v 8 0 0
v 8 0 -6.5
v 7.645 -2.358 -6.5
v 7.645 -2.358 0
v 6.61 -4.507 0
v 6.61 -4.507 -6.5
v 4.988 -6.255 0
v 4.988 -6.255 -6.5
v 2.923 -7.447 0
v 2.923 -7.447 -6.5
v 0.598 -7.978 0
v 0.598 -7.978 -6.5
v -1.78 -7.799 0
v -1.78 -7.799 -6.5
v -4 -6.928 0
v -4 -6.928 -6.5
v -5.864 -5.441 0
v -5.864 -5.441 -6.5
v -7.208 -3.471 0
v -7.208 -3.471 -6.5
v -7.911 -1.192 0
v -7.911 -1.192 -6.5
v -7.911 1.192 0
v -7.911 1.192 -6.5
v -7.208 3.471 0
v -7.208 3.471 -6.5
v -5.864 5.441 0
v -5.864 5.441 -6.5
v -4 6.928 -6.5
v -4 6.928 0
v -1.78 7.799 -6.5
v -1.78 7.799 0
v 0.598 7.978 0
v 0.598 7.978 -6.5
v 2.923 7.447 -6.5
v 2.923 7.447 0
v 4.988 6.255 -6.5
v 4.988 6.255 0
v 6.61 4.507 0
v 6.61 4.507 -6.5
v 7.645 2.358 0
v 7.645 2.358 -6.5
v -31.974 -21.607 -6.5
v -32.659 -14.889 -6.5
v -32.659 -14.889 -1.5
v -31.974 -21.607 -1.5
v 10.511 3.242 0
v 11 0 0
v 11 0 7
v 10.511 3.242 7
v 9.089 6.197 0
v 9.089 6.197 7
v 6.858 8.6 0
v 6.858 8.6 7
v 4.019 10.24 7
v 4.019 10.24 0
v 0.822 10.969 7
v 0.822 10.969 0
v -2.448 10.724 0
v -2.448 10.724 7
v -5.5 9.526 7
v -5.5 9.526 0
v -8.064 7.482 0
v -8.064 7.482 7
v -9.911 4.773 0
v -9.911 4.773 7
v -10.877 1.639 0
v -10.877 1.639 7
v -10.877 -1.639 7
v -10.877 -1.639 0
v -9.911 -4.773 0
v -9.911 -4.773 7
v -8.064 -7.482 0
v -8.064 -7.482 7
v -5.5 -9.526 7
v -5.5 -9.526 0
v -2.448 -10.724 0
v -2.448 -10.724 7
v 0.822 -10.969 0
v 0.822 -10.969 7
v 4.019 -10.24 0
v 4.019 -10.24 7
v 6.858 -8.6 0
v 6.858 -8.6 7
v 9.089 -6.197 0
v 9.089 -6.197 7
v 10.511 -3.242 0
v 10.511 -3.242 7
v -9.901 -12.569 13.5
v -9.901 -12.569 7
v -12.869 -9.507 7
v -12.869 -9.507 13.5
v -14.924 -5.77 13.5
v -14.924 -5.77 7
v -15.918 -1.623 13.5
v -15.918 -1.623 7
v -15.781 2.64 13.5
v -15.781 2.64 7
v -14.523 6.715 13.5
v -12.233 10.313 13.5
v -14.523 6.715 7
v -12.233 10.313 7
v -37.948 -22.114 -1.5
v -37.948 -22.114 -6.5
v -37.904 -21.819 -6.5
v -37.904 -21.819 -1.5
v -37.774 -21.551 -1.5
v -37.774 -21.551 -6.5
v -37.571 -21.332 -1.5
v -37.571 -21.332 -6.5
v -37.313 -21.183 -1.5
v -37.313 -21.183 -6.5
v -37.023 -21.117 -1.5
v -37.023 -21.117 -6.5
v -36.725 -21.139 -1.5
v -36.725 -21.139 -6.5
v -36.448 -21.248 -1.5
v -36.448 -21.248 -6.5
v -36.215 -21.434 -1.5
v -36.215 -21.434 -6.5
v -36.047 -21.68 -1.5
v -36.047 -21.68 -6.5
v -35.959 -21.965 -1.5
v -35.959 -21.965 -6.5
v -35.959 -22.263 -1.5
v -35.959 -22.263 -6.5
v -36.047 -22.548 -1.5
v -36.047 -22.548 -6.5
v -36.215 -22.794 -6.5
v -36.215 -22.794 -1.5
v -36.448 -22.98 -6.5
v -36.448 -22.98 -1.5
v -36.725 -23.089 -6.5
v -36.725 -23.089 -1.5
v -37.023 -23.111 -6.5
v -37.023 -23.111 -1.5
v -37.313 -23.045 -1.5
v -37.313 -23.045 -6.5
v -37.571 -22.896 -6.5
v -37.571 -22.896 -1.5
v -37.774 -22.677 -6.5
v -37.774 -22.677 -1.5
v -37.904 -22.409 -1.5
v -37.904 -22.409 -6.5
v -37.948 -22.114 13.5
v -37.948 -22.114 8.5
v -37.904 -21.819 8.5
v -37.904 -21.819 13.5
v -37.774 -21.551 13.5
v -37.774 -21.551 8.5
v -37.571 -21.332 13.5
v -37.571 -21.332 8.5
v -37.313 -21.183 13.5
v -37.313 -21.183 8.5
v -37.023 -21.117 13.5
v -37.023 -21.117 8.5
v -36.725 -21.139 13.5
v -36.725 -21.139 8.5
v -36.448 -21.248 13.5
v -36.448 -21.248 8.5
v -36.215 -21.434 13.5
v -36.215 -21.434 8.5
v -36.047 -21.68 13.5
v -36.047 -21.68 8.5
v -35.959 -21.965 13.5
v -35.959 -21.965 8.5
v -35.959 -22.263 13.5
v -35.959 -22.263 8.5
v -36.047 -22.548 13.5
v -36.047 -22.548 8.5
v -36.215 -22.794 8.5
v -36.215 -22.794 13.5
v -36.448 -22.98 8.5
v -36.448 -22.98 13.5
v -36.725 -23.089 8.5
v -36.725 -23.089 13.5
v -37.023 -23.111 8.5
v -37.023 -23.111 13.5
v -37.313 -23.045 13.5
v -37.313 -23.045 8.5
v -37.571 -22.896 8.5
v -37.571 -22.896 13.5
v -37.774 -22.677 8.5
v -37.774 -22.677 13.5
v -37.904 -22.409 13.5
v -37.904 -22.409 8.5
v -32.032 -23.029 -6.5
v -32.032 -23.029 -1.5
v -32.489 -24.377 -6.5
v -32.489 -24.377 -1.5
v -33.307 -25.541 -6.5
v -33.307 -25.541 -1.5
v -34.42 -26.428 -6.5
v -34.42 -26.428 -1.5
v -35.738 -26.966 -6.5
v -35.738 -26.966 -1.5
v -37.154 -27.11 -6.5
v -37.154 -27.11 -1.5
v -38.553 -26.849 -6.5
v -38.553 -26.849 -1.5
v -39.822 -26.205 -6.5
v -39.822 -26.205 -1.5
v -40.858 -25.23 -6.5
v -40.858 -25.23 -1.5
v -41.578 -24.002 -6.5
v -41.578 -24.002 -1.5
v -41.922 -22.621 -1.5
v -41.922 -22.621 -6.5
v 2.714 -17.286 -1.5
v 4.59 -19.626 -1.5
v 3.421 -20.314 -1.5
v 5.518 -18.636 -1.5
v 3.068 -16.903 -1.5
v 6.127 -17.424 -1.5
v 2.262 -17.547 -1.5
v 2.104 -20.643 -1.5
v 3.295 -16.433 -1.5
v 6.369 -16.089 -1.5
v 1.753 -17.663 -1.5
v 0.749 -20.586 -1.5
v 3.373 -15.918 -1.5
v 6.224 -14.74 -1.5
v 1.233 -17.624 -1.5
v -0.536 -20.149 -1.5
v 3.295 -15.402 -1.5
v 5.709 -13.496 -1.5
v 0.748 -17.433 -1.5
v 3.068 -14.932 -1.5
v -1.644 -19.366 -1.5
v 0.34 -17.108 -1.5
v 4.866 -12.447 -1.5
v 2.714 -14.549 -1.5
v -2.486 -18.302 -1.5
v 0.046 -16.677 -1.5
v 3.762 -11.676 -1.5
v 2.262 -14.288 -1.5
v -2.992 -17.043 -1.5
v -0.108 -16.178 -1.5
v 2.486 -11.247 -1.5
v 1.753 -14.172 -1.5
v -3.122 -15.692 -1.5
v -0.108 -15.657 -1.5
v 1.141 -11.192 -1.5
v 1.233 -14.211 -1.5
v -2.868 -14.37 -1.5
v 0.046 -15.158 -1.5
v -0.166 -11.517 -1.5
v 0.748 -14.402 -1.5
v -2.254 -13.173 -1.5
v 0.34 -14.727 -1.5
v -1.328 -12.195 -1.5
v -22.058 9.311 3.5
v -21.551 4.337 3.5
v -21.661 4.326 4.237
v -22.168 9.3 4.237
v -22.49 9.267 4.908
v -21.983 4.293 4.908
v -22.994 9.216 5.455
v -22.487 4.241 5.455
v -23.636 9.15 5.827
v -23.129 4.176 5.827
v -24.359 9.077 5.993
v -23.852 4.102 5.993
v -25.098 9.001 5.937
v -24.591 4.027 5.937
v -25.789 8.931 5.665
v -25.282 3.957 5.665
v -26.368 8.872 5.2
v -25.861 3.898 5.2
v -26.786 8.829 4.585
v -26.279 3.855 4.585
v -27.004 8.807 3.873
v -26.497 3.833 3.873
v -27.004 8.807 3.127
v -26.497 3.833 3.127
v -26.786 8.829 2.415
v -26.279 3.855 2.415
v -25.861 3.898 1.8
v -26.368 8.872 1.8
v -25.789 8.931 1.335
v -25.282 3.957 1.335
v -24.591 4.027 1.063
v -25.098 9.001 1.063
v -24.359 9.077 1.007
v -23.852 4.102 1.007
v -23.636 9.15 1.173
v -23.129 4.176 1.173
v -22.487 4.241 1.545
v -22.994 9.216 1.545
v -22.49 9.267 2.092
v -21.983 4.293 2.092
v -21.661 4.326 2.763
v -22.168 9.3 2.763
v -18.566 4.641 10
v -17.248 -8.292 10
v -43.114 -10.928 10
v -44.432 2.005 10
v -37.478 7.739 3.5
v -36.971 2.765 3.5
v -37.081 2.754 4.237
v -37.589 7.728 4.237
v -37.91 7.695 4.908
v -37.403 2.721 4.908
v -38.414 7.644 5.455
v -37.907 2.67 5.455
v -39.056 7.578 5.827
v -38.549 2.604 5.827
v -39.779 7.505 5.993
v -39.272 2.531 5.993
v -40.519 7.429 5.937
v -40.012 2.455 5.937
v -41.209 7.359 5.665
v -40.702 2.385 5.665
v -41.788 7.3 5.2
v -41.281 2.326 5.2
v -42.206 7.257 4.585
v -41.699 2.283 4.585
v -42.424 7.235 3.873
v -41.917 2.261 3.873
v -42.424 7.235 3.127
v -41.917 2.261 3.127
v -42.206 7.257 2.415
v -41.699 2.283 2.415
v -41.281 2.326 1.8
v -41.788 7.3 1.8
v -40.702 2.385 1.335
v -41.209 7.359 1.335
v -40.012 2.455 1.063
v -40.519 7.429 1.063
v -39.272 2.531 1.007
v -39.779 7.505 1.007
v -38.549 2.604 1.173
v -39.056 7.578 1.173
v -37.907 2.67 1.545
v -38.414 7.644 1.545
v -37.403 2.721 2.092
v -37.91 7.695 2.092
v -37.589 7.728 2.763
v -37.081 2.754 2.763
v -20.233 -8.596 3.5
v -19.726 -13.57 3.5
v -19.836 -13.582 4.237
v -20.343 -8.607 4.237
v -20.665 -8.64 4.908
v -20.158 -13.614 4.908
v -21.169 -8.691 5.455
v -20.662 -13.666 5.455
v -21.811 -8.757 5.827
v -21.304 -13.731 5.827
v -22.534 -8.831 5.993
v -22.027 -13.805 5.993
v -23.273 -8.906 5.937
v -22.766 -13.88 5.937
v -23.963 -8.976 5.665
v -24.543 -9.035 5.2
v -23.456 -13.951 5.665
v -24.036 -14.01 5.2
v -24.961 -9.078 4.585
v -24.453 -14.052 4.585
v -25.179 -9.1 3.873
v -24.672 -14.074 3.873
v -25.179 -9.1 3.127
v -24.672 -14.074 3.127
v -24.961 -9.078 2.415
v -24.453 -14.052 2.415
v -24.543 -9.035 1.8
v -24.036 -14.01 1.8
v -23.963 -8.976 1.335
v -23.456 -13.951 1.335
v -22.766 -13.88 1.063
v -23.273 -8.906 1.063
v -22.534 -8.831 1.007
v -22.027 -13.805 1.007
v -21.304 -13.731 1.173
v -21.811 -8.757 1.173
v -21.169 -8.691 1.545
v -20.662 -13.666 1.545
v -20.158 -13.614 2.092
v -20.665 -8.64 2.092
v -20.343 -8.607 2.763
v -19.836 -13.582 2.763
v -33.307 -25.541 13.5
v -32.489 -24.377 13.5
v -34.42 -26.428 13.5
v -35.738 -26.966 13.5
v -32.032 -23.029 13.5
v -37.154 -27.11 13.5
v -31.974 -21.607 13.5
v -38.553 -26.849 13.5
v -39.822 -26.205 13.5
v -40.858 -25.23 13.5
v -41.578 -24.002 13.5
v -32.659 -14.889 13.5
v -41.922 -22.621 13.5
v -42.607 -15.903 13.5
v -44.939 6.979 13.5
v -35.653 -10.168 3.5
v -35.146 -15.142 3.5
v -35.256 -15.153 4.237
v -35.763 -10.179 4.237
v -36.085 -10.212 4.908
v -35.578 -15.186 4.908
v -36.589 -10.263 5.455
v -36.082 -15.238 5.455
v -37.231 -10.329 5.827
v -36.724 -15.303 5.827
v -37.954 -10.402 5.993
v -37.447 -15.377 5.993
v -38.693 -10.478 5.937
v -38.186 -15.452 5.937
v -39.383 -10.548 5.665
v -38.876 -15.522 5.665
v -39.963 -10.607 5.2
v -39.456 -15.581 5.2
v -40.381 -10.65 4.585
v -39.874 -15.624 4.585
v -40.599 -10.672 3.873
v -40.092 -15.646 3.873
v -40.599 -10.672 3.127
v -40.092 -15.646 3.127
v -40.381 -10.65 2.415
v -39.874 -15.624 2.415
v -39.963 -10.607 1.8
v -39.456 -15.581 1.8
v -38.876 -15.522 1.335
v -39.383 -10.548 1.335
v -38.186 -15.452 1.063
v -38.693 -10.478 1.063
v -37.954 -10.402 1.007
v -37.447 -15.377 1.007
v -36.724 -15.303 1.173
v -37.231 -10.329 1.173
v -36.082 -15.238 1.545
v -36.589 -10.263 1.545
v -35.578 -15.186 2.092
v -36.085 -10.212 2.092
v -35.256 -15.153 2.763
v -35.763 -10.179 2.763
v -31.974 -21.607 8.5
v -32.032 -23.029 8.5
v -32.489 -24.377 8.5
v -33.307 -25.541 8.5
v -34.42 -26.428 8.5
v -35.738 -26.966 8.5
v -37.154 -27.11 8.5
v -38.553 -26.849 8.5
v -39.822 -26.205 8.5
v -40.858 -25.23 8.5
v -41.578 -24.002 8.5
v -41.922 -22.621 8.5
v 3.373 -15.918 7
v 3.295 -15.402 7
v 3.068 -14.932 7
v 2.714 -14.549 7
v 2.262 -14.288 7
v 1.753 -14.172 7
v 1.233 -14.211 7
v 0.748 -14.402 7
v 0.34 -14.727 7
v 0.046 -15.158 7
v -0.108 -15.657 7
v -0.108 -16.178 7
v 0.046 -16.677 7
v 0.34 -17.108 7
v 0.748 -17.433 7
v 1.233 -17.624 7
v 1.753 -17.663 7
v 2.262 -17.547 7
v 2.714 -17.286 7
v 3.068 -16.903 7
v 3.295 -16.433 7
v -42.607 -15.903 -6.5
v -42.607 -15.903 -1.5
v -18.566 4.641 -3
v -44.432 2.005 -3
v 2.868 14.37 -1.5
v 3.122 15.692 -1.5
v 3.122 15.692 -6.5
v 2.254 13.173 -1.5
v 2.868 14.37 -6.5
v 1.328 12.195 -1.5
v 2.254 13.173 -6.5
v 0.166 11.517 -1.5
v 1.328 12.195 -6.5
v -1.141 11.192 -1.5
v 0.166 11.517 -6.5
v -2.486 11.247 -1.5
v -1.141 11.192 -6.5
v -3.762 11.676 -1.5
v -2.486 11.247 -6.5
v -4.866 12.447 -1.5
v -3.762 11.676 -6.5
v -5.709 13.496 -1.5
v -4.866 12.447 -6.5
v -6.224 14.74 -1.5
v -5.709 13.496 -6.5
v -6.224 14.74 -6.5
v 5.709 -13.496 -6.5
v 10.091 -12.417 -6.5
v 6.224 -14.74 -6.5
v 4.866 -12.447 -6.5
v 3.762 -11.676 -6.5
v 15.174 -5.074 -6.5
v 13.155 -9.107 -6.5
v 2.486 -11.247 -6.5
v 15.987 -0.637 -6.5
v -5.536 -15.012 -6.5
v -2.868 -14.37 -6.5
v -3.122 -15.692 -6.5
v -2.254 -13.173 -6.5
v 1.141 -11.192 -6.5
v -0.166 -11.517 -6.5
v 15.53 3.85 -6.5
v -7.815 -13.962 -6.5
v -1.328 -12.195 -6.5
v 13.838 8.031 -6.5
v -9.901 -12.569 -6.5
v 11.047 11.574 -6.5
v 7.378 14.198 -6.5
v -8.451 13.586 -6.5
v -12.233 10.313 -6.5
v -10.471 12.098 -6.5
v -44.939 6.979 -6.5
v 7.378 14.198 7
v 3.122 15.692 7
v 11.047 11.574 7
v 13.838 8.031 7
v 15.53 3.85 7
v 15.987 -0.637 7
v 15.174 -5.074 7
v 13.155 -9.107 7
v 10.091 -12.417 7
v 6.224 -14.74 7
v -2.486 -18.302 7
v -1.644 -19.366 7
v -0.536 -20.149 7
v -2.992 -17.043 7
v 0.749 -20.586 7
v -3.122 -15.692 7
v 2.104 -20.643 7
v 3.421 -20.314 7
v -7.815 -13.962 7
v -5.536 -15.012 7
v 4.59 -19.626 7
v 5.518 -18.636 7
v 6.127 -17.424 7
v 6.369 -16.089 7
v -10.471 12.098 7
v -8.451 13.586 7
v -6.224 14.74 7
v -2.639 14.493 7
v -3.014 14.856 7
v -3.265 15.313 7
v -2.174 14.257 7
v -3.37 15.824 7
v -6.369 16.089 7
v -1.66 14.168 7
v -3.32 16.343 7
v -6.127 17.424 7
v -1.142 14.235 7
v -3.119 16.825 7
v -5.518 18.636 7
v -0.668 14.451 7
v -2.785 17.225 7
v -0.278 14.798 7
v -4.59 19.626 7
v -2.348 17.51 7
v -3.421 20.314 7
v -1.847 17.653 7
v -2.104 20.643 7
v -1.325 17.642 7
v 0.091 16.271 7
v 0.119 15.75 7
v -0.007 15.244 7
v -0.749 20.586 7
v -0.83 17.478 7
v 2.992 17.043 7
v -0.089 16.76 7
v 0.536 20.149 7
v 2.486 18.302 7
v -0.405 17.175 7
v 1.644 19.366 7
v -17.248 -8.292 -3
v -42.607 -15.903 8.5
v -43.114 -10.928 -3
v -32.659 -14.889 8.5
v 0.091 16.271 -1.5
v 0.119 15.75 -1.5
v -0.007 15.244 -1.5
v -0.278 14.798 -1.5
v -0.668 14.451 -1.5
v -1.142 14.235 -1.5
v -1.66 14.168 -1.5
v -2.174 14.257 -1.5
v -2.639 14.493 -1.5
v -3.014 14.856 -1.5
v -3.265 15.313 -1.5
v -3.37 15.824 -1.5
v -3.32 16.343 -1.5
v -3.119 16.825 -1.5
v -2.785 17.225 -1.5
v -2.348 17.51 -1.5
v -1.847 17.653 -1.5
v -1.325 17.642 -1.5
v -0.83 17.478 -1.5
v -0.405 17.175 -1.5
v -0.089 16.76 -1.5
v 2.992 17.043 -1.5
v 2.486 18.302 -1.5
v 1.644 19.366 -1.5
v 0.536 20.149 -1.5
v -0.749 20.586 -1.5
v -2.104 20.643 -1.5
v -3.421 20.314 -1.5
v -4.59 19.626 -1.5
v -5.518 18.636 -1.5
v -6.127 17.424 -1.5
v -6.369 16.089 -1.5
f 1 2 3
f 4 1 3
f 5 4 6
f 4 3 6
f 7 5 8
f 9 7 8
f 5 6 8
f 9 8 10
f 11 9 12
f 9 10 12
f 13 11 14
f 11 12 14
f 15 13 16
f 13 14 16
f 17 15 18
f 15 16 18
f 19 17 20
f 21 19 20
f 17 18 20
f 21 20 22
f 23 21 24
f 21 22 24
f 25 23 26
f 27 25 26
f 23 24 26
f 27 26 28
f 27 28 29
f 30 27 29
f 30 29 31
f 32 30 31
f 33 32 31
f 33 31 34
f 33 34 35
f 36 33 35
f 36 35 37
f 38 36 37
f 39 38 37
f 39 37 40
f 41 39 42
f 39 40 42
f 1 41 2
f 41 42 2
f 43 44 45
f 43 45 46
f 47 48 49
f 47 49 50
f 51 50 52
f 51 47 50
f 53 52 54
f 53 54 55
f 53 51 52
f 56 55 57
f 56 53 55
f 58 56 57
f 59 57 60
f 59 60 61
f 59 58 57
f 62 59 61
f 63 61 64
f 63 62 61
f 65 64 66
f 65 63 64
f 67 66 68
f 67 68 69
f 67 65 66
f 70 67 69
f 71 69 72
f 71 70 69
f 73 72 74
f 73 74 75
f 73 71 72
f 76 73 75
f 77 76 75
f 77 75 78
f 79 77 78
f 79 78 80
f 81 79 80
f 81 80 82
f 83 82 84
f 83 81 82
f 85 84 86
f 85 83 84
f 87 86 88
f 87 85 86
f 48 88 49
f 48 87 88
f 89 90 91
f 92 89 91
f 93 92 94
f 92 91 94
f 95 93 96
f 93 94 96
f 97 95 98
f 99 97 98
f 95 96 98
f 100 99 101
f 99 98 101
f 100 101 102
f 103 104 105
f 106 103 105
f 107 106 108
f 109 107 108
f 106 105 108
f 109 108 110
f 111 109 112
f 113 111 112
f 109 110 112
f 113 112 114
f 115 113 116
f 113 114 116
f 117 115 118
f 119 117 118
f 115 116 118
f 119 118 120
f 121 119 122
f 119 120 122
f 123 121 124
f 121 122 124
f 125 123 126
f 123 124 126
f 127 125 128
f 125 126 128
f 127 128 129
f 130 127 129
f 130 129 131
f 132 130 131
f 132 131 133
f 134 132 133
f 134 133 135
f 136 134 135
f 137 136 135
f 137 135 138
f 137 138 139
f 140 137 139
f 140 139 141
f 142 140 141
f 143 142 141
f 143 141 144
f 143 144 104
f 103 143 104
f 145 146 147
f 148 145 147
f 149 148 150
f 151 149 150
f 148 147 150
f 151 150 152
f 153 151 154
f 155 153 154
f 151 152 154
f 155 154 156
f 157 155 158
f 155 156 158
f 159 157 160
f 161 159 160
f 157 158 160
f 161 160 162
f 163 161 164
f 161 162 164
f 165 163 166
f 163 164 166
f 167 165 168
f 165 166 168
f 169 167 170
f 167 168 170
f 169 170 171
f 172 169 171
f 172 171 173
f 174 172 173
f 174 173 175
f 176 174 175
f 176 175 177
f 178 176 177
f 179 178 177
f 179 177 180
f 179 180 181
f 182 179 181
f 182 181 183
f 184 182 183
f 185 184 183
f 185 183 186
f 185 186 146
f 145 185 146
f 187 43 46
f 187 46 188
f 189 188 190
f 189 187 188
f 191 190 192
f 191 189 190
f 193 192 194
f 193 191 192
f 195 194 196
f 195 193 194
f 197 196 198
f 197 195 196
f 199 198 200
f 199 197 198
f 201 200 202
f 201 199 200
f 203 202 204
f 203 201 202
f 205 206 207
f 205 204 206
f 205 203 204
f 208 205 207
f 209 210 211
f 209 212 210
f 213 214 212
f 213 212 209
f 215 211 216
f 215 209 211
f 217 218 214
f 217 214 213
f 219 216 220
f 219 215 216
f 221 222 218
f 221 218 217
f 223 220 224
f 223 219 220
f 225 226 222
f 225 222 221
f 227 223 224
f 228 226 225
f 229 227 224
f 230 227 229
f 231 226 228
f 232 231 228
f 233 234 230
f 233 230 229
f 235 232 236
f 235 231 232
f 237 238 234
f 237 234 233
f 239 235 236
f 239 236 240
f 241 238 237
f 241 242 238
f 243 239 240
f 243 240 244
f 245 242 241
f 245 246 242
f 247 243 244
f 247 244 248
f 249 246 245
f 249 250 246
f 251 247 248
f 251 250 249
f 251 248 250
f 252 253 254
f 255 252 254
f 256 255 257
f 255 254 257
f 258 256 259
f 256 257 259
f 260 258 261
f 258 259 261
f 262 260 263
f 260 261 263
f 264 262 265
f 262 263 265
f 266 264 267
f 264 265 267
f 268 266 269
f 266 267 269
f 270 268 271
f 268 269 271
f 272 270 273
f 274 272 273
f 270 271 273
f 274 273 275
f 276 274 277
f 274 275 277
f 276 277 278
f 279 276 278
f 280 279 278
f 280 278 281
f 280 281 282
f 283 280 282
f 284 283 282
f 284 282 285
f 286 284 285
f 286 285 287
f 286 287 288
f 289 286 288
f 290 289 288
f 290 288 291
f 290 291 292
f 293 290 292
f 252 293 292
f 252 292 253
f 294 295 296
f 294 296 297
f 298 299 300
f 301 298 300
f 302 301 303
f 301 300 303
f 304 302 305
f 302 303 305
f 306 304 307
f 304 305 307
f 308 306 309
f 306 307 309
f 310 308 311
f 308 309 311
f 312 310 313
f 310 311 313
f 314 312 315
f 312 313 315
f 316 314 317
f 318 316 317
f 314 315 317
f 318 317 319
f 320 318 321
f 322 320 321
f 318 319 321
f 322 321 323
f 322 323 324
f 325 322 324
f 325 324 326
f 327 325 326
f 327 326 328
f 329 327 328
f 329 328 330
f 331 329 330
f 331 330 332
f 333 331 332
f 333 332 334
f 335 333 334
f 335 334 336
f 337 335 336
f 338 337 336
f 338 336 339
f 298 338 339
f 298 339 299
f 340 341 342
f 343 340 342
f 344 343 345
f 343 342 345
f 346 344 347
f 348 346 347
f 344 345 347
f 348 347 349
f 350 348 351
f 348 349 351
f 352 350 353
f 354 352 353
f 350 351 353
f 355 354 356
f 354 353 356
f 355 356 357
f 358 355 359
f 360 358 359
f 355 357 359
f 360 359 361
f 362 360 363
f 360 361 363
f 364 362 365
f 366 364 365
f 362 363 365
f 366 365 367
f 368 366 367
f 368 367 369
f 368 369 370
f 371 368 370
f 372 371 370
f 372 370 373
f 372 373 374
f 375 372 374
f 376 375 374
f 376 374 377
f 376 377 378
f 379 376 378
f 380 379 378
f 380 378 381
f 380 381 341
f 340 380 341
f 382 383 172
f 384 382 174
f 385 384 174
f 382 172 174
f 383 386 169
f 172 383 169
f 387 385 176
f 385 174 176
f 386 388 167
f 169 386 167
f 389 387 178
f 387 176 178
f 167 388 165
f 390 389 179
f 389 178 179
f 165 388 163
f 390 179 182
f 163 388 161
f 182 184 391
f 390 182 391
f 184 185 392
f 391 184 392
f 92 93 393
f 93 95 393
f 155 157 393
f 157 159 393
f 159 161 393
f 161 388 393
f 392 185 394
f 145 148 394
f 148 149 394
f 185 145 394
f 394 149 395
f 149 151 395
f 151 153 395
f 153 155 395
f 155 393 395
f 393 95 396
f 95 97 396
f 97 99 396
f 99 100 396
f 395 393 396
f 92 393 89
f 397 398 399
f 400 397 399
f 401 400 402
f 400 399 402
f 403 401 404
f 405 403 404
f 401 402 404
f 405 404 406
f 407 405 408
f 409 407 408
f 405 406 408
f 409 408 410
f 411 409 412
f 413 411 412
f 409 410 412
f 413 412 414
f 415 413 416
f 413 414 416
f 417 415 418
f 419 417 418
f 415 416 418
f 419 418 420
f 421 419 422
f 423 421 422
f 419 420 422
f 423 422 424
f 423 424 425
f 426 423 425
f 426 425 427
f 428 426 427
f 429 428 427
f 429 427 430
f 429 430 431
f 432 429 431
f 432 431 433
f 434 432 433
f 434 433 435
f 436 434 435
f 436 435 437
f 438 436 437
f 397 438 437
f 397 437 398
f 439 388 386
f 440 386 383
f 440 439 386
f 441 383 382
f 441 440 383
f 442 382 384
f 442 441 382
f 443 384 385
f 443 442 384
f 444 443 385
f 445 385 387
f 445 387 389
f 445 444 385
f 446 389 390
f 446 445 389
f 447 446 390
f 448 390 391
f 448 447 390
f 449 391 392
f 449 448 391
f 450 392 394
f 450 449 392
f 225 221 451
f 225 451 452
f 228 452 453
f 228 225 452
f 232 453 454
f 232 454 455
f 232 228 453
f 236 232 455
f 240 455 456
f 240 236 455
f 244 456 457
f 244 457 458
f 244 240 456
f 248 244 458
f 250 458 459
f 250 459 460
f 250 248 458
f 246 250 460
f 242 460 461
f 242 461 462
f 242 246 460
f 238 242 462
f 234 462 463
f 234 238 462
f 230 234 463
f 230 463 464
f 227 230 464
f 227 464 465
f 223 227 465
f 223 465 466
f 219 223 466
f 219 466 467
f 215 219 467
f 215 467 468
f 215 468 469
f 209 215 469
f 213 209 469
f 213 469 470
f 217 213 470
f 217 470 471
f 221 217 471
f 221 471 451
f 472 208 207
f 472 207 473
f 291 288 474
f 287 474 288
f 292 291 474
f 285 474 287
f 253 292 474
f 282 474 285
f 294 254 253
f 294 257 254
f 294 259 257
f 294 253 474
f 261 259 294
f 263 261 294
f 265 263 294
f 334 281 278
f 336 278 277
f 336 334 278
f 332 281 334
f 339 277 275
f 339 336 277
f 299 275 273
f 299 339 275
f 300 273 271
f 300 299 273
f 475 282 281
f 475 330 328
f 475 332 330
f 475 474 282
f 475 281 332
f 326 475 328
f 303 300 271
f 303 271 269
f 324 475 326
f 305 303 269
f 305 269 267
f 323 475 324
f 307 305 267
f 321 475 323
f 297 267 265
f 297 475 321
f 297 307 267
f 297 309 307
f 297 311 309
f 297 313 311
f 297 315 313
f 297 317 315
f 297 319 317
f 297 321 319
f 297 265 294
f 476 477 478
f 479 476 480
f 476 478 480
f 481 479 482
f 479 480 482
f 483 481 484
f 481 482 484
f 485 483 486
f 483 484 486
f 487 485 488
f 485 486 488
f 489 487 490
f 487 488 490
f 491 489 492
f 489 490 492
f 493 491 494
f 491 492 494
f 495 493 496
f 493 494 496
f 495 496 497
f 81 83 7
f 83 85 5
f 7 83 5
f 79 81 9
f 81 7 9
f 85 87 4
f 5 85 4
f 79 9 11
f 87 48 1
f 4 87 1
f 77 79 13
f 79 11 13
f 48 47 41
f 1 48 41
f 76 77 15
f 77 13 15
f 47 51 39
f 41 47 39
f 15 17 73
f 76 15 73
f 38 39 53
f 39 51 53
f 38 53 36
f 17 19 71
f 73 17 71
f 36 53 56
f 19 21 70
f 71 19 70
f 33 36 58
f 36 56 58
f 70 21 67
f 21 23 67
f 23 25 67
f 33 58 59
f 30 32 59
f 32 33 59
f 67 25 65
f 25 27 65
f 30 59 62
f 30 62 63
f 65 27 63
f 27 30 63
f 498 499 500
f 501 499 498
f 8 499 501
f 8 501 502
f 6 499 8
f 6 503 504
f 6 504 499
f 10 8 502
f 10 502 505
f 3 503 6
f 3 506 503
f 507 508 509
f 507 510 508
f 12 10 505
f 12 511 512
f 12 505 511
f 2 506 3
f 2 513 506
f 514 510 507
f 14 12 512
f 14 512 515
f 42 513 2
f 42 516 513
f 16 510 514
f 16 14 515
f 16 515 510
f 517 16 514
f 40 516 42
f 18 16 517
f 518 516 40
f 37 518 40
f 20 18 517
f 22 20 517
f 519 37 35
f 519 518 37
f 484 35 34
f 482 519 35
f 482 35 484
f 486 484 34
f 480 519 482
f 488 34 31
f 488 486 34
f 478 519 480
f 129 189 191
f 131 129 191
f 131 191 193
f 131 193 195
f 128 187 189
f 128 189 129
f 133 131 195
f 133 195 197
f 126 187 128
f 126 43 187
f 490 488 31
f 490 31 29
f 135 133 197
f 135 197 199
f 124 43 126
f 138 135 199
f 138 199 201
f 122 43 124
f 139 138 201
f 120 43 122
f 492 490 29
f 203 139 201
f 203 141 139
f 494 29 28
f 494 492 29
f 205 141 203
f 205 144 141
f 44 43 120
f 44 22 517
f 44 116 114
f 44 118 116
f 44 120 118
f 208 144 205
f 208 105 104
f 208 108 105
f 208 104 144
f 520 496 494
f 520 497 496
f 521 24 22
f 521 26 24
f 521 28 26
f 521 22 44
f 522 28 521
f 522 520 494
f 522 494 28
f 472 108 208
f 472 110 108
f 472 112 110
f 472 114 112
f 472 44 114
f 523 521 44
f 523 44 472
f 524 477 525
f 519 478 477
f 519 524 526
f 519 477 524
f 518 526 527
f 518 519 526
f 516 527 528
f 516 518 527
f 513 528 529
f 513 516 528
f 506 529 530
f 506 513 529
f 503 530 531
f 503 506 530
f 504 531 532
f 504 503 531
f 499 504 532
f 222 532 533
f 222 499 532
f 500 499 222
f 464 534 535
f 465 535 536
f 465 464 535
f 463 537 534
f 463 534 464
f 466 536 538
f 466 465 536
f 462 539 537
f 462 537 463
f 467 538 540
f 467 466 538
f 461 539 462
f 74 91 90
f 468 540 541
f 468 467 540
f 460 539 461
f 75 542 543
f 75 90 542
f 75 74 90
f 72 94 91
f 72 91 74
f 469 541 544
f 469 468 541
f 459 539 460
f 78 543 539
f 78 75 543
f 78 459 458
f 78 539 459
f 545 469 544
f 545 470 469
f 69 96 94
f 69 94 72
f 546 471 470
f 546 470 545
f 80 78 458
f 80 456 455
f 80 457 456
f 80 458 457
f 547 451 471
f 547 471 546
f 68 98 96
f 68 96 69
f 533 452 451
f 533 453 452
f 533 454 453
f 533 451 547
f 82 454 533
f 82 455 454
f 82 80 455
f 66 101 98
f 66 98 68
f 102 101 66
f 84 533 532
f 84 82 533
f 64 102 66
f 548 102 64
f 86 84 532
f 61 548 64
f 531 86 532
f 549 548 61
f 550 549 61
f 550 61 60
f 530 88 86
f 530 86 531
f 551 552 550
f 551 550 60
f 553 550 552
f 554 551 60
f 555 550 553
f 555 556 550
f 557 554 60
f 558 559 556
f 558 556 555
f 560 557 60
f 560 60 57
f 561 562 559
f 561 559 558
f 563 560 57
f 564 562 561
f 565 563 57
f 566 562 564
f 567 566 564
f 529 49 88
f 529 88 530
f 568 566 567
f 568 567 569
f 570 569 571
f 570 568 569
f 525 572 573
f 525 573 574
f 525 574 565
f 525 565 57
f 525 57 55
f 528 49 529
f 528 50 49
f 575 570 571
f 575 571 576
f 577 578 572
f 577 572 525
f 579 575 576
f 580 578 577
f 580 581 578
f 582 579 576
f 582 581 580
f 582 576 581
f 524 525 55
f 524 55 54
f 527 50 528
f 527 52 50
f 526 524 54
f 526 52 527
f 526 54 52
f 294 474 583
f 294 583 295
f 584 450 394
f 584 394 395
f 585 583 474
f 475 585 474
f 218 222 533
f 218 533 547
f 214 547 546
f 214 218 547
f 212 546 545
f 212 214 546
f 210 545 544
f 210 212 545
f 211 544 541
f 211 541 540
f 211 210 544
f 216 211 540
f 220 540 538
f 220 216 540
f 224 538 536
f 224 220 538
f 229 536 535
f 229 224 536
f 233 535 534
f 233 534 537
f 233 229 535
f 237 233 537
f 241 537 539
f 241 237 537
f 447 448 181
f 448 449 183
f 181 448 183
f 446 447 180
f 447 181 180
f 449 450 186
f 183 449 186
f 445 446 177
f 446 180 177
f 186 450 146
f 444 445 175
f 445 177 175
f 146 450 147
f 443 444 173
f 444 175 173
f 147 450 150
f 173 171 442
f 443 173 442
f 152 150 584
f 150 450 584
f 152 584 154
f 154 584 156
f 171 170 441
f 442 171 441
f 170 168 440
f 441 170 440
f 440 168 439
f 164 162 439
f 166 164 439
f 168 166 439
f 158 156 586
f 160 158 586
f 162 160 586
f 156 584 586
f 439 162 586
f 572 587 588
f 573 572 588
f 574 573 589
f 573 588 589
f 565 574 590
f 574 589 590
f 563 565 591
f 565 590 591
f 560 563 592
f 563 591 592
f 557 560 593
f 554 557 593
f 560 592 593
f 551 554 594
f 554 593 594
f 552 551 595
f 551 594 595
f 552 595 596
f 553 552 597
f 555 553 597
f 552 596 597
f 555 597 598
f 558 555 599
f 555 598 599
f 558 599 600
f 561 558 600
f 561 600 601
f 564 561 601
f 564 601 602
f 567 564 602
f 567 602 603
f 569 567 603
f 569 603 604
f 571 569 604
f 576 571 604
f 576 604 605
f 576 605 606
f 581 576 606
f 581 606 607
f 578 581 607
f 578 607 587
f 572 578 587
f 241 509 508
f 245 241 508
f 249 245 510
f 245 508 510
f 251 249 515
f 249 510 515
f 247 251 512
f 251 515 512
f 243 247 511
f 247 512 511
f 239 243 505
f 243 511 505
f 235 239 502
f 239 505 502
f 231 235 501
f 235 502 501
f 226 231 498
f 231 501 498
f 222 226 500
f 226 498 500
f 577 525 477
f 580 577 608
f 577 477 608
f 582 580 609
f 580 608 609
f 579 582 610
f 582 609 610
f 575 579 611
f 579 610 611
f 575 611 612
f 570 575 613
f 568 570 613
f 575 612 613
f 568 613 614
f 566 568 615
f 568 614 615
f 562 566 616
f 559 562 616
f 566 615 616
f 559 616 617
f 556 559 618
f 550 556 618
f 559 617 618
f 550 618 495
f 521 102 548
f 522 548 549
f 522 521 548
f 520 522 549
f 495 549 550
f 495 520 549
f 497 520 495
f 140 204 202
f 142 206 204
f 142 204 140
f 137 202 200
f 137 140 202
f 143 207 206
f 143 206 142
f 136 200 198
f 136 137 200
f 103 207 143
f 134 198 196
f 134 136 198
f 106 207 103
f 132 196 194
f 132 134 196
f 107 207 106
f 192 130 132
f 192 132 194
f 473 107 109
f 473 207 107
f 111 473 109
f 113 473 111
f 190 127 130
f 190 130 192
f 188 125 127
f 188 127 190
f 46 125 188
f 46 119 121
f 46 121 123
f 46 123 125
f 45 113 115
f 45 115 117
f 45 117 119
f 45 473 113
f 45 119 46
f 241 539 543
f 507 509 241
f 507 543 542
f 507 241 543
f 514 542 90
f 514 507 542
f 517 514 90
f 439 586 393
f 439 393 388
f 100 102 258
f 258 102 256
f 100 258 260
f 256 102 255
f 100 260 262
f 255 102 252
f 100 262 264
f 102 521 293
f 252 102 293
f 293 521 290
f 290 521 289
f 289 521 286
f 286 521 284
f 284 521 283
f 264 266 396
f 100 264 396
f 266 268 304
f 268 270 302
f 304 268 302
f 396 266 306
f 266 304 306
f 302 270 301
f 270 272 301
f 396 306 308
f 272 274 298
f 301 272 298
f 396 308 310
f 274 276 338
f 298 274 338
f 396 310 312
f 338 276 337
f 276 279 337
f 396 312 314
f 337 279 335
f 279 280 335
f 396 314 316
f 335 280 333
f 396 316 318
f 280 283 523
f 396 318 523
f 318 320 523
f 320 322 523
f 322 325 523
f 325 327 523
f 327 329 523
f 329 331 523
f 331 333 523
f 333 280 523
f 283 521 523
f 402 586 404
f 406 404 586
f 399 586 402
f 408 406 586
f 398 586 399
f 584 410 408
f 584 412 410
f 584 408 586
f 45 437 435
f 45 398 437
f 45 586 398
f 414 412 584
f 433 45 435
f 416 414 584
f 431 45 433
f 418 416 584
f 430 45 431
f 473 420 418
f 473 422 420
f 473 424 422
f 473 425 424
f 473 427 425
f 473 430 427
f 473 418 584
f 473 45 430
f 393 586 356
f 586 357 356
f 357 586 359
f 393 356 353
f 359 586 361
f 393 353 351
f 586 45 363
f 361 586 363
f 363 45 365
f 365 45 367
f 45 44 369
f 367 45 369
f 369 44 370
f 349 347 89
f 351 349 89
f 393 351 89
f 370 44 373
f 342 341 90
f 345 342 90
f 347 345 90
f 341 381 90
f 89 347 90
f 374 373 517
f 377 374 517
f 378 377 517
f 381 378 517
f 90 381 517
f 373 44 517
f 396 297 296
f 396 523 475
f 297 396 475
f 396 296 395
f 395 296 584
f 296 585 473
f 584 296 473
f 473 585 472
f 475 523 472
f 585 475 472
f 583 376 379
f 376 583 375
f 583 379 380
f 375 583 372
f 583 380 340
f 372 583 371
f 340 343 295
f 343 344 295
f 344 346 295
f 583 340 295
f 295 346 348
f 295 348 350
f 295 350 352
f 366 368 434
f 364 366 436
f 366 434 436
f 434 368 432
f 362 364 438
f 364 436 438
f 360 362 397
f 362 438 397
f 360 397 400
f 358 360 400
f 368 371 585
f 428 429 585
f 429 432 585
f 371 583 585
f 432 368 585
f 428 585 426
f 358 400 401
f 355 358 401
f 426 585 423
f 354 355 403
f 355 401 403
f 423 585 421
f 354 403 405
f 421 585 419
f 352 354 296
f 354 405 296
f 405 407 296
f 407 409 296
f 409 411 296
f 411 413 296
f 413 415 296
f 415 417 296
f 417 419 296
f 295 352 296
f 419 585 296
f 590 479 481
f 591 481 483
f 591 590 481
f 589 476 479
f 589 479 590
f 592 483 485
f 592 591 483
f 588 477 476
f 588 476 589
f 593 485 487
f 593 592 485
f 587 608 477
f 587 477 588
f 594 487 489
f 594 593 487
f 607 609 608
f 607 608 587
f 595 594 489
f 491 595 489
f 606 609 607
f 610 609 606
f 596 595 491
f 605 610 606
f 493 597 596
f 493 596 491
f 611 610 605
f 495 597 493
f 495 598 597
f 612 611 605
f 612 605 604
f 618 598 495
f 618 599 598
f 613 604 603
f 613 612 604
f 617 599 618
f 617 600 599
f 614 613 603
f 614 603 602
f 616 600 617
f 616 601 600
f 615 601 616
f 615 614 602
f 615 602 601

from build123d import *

# Parameters (mm, degrees)
SKETCH1_R                = 16
SKETCH1_R_2              = 11
BOSS_EXTRUDE1_DEPTH      = 7
BOSS_EXTRUDE2_DEPTH      = 10
BOSS_EXTRUDE2_DEPTH_BACK = 10
SKETCH3_W                = 13
SKETCH3_H                = 13
CUT_EXTRUDE1_DEPTH       = 26
BOSS_EXTRUDE5_START      = 6.5
SKETCH8_R                = 16
SKETCH8_R_2              = 8
BOSS_EXTRUDE5_DEPTH      = 6.5
SKETCH9_R                = 1
BOSS_EXTRUDE6_DEPTH      = 20
CUT_EXTRUDE3_DEPTH       = 5
CUT_EXTRUDE3_DEPTH_BACK  = 5
BOSS_EXTRUDE7_START      = -8.5
BOSS_EXTRUDE7_DEPTH      = 8.5
CUT_EXTRUDE4_START       = -13.5
SKETCH12_R               = 1.75
CUT_EXTRUDE4_DEPTH       = 13.5
SKETCH13_R               = 4.75
CUT_EXTRUDE5_DEPTH       = 5
CUT_EXTRUDE6_REACH       = 59.783
SKETCH14_R               = 2.5


with BuildPart() as part:
    # Sketch1 → Boss-Extrude1 (new body)
    with BuildSketch(Plane.XY):
        Circle(SKETCH1_R)
        Circle(SKETCH1_R_2, mode=Mode.SUBTRACT)
    extrude(amount=BOSS_EXTRUDE1_DEPTH)

    # Sketch2 → Boss-Extrude2 (add, two sides: drawn at the far end of the back side and taken through both)
    with BuildSketch(Plane.XY.offset(3.5).offset(-BOSS_EXTRUDE2_DEPTH_BACK)):
        with BuildLine():
            Line((-12.233132214, 10.312636725), (-44.939361172, 6.978812037))
            Line((-44.939361172, 6.978812037), (-42.607001327, -15.902623617))
            Line((-42.607001327, -15.902623617), (-9.900772369, -12.568798928))
            ThreePointArc((-9.900772369, -12.568798928), (-15.917520454, -1.622511196), (-12.233132214, 10.312636725))
        make_face()
    extrude(amount=BOSS_EXTRUDE2_DEPTH + BOSS_EXTRUDE2_DEPTH_BACK)

    # Sketch3 → Cut-Extrude1 (cut)
    with BuildSketch(Plane(origin=(-43.77318125, -4.46190579, 0), x_dir=(0, 0, 1), z_dir=(-0.9948450284027645, -0.10140694977319323, 0))):
        with Locations((3.5, 0)):
            Rectangle(SKETCH3_W, SKETCH3_H)
    extrude(amount=-CUT_EXTRUDE1_DEPTH, mode=Mode.SUBTRACT)

    # Sketch8 → Boss-Extrude5 (add)
    with BuildSketch(Plane(origin=(0, 0, 0), x_dir=(-1, 0, 0), z_dir=(0, 0, -1)).offset(BOSS_EXTRUDE5_START)):
        Circle(SKETCH8_R)
        with Locations(Location((0, 0, 0), (0, 0, 180))):
            Circle(SKETCH8_R_2, mode=Mode.SUBTRACT)
    extrude(amount=-BOSS_EXTRUDE5_DEPTH)

    # Sketch9 → Boss-Extrude6 (add)
    with BuildSketch(Plane(origin=(0, 0, -6.5), x_dir=(-1, 0, 0), z_dir=(0, 0, -1))):
        with BuildLine():
            Line((42.607001327, -15.902623617), (32.658551043, -14.888554119))
            Line((32.658551043, -14.888554119), (31.973720208, -21.607033999))
            ThreePointArc((31.973720208, -21.607033999), (36.440910601, -27.08829389), (41.922170492, -22.621103497))
            Line((41.922170492, -22.621103497), (42.607001327, -15.902623617))
        make_face()
        with Locations((36.94794535, -22.114068748)):
            Circle(SKETCH9_R, mode=Mode.SUBTRACT)
    extrude(amount=-BOSS_EXTRUDE6_DEPTH)

    # Sketch10 → Cut-Extrude3 (cut, two sides: drawn at the far end of the back side and taken through both)
    with BuildSketch(Plane.XY.offset(3.5).offset(-CUT_EXTRUDE3_DEPTH_BACK)):
        with BuildLine():
            Line((-32.658551043, -14.888554119), (-42.607001327, -15.902623617))
            Line((-42.607001327, -15.902623617), (-41.922170492, -22.621103497))
            ThreePointArc((-41.922170492, -22.621103497), (-36.440910601, -27.08829389), (-31.973720208, -21.607033999))
            Line((-31.973720208, -21.607033999), (-32.658551043, -14.888554119))
        make_face()
    extrude(amount=CUT_EXTRUDE3_DEPTH + CUT_EXTRUDE3_DEPTH_BACK, mode=Mode.SUBTRACT)

    # Sketch11 → Boss-Extrude7 (add)
    with BuildSketch(Plane.XY.offset(7).offset(BOSS_EXTRUDE7_START)):
        with BuildLine():
            ThreePointArc((6.224175029, -14.739730161), (2.104194208, -20.643034339), (-3.12215228, -15.692423813))
            ThreePointArc((-3.12215228, -15.692423813), (1.622511196, -15.917520454), (6.224175029, -14.739730161))
        make_face()
    boss_extrude7 = extrude(amount=BOSS_EXTRUDE7_DEPTH)

    # Sketch12 → Cut-Extrude4 (cut)
    with BuildSketch(Plane.XY.offset(7).offset(CUT_EXTRUDE4_START)):
        with Locations((1.622511196, -15.917520454)):
            Circle(SKETCH12_R)
    cut_extrude4 = extrude(amount=CUT_EXTRUDE4_DEPTH, mode=Mode.SUBTRACT)

    # Mirror1: Boss-Extrude7, Cut-Extrude4 across plane
    add(boss_extrude7.mirror(Plane(origin=(0, 0, 0), x_dir=(0, 0, 1), z_dir=(0.10140694977319331, -0.9948450284027645, 0))))
    add(cut_extrude4.mirror(Plane(origin=(0, 0, 0), x_dir=(0, 0, 1), z_dir=(0.10140694977319331, -0.9948450284027645, 0))), mode=Mode.SUBTRACT)

    # Sketch13 → Cut-Extrude5 (cut)
    with BuildSketch(Plane(origin=(0, 0, -6.5), x_dir=(-1, 0, 0), z_dir=(0, 0, -1))):
        with Locations((-1.622511196, -15.917520454)):
            Circle(SKETCH13_R)
        with Locations((1.622511196, 15.917520454)):
            Circle(SKETCH13_R)
    extrude(amount=-CUT_EXTRUDE5_DEPTH, mode=Mode.SUBTRACT)

    # Cut-Extrude6: up to this face of the body (flat: up to its plane)
    cut_extrude6_end = Plane(part.part.faces().sort_by_distance((-28.586246693, 8.645724381, 3.5))[0])
    # Sketch14 → Cut-Extrude6 (cut, up to the picked face)
    with BuildSketch(Plane(origin=(1.166179922, -11.440717827, 0), x_dir=(0.9948450284027645, 0.1014069497731933, 0), z_dir=(0.1014069497731933, -0.9948450284027645, 0)), mode=Mode.PRIVATE) as cut_extrude6_sk1:
        with Locations((-39, 3.5)):
            Circle(SKETCH14_R)
    cut_extrude6_tool1 = split(extrude(cut_extrude6_sk1.sketch, amount=-CUT_EXTRUDE6_REACH, mode=Mode.PRIVATE), bisect_by=cut_extrude6_end, keep=Keep.BOTH, mode=Mode.PRIVATE)
    # Sketch14 → Cut-Extrude6 (cut, up to the picked face)
    with BuildSketch(Plane(origin=(1.166179922, -11.440717827, 0), x_dir=(0.9948450284027645, 0.1014069497731933, 0), z_dir=(0.1014069497731933, -0.9948450284027645, 0)), mode=Mode.PRIVATE) as cut_extrude6_sk2:
        with Locations((-23.5, 3.5)):
            Circle(SKETCH14_R)
    cut_extrude6_tool2 = split(extrude(cut_extrude6_sk2.sketch, amount=-CUT_EXTRUDE6_REACH, mode=Mode.PRIVATE), bisect_by=cut_extrude6_end, keep=Keep.BOTH, mode=Mode.PRIVATE)
    add(cut_extrude6_tool1.solids().sort_by(Axis((-37.632776, -15.395589, 3.5), (-0.1014069497731933, 0.9948450284027645, 0)))[0], mode=Mode.SUBTRACT)
    add(cut_extrude6_tool2.solids().sort_by(Axis((-22.212678, -13.823781, 3.5), (-0.1014069497731933, 0.9948450284027645, 0)))[0], mode=Mode.SUBTRACT)


solid = part.part
